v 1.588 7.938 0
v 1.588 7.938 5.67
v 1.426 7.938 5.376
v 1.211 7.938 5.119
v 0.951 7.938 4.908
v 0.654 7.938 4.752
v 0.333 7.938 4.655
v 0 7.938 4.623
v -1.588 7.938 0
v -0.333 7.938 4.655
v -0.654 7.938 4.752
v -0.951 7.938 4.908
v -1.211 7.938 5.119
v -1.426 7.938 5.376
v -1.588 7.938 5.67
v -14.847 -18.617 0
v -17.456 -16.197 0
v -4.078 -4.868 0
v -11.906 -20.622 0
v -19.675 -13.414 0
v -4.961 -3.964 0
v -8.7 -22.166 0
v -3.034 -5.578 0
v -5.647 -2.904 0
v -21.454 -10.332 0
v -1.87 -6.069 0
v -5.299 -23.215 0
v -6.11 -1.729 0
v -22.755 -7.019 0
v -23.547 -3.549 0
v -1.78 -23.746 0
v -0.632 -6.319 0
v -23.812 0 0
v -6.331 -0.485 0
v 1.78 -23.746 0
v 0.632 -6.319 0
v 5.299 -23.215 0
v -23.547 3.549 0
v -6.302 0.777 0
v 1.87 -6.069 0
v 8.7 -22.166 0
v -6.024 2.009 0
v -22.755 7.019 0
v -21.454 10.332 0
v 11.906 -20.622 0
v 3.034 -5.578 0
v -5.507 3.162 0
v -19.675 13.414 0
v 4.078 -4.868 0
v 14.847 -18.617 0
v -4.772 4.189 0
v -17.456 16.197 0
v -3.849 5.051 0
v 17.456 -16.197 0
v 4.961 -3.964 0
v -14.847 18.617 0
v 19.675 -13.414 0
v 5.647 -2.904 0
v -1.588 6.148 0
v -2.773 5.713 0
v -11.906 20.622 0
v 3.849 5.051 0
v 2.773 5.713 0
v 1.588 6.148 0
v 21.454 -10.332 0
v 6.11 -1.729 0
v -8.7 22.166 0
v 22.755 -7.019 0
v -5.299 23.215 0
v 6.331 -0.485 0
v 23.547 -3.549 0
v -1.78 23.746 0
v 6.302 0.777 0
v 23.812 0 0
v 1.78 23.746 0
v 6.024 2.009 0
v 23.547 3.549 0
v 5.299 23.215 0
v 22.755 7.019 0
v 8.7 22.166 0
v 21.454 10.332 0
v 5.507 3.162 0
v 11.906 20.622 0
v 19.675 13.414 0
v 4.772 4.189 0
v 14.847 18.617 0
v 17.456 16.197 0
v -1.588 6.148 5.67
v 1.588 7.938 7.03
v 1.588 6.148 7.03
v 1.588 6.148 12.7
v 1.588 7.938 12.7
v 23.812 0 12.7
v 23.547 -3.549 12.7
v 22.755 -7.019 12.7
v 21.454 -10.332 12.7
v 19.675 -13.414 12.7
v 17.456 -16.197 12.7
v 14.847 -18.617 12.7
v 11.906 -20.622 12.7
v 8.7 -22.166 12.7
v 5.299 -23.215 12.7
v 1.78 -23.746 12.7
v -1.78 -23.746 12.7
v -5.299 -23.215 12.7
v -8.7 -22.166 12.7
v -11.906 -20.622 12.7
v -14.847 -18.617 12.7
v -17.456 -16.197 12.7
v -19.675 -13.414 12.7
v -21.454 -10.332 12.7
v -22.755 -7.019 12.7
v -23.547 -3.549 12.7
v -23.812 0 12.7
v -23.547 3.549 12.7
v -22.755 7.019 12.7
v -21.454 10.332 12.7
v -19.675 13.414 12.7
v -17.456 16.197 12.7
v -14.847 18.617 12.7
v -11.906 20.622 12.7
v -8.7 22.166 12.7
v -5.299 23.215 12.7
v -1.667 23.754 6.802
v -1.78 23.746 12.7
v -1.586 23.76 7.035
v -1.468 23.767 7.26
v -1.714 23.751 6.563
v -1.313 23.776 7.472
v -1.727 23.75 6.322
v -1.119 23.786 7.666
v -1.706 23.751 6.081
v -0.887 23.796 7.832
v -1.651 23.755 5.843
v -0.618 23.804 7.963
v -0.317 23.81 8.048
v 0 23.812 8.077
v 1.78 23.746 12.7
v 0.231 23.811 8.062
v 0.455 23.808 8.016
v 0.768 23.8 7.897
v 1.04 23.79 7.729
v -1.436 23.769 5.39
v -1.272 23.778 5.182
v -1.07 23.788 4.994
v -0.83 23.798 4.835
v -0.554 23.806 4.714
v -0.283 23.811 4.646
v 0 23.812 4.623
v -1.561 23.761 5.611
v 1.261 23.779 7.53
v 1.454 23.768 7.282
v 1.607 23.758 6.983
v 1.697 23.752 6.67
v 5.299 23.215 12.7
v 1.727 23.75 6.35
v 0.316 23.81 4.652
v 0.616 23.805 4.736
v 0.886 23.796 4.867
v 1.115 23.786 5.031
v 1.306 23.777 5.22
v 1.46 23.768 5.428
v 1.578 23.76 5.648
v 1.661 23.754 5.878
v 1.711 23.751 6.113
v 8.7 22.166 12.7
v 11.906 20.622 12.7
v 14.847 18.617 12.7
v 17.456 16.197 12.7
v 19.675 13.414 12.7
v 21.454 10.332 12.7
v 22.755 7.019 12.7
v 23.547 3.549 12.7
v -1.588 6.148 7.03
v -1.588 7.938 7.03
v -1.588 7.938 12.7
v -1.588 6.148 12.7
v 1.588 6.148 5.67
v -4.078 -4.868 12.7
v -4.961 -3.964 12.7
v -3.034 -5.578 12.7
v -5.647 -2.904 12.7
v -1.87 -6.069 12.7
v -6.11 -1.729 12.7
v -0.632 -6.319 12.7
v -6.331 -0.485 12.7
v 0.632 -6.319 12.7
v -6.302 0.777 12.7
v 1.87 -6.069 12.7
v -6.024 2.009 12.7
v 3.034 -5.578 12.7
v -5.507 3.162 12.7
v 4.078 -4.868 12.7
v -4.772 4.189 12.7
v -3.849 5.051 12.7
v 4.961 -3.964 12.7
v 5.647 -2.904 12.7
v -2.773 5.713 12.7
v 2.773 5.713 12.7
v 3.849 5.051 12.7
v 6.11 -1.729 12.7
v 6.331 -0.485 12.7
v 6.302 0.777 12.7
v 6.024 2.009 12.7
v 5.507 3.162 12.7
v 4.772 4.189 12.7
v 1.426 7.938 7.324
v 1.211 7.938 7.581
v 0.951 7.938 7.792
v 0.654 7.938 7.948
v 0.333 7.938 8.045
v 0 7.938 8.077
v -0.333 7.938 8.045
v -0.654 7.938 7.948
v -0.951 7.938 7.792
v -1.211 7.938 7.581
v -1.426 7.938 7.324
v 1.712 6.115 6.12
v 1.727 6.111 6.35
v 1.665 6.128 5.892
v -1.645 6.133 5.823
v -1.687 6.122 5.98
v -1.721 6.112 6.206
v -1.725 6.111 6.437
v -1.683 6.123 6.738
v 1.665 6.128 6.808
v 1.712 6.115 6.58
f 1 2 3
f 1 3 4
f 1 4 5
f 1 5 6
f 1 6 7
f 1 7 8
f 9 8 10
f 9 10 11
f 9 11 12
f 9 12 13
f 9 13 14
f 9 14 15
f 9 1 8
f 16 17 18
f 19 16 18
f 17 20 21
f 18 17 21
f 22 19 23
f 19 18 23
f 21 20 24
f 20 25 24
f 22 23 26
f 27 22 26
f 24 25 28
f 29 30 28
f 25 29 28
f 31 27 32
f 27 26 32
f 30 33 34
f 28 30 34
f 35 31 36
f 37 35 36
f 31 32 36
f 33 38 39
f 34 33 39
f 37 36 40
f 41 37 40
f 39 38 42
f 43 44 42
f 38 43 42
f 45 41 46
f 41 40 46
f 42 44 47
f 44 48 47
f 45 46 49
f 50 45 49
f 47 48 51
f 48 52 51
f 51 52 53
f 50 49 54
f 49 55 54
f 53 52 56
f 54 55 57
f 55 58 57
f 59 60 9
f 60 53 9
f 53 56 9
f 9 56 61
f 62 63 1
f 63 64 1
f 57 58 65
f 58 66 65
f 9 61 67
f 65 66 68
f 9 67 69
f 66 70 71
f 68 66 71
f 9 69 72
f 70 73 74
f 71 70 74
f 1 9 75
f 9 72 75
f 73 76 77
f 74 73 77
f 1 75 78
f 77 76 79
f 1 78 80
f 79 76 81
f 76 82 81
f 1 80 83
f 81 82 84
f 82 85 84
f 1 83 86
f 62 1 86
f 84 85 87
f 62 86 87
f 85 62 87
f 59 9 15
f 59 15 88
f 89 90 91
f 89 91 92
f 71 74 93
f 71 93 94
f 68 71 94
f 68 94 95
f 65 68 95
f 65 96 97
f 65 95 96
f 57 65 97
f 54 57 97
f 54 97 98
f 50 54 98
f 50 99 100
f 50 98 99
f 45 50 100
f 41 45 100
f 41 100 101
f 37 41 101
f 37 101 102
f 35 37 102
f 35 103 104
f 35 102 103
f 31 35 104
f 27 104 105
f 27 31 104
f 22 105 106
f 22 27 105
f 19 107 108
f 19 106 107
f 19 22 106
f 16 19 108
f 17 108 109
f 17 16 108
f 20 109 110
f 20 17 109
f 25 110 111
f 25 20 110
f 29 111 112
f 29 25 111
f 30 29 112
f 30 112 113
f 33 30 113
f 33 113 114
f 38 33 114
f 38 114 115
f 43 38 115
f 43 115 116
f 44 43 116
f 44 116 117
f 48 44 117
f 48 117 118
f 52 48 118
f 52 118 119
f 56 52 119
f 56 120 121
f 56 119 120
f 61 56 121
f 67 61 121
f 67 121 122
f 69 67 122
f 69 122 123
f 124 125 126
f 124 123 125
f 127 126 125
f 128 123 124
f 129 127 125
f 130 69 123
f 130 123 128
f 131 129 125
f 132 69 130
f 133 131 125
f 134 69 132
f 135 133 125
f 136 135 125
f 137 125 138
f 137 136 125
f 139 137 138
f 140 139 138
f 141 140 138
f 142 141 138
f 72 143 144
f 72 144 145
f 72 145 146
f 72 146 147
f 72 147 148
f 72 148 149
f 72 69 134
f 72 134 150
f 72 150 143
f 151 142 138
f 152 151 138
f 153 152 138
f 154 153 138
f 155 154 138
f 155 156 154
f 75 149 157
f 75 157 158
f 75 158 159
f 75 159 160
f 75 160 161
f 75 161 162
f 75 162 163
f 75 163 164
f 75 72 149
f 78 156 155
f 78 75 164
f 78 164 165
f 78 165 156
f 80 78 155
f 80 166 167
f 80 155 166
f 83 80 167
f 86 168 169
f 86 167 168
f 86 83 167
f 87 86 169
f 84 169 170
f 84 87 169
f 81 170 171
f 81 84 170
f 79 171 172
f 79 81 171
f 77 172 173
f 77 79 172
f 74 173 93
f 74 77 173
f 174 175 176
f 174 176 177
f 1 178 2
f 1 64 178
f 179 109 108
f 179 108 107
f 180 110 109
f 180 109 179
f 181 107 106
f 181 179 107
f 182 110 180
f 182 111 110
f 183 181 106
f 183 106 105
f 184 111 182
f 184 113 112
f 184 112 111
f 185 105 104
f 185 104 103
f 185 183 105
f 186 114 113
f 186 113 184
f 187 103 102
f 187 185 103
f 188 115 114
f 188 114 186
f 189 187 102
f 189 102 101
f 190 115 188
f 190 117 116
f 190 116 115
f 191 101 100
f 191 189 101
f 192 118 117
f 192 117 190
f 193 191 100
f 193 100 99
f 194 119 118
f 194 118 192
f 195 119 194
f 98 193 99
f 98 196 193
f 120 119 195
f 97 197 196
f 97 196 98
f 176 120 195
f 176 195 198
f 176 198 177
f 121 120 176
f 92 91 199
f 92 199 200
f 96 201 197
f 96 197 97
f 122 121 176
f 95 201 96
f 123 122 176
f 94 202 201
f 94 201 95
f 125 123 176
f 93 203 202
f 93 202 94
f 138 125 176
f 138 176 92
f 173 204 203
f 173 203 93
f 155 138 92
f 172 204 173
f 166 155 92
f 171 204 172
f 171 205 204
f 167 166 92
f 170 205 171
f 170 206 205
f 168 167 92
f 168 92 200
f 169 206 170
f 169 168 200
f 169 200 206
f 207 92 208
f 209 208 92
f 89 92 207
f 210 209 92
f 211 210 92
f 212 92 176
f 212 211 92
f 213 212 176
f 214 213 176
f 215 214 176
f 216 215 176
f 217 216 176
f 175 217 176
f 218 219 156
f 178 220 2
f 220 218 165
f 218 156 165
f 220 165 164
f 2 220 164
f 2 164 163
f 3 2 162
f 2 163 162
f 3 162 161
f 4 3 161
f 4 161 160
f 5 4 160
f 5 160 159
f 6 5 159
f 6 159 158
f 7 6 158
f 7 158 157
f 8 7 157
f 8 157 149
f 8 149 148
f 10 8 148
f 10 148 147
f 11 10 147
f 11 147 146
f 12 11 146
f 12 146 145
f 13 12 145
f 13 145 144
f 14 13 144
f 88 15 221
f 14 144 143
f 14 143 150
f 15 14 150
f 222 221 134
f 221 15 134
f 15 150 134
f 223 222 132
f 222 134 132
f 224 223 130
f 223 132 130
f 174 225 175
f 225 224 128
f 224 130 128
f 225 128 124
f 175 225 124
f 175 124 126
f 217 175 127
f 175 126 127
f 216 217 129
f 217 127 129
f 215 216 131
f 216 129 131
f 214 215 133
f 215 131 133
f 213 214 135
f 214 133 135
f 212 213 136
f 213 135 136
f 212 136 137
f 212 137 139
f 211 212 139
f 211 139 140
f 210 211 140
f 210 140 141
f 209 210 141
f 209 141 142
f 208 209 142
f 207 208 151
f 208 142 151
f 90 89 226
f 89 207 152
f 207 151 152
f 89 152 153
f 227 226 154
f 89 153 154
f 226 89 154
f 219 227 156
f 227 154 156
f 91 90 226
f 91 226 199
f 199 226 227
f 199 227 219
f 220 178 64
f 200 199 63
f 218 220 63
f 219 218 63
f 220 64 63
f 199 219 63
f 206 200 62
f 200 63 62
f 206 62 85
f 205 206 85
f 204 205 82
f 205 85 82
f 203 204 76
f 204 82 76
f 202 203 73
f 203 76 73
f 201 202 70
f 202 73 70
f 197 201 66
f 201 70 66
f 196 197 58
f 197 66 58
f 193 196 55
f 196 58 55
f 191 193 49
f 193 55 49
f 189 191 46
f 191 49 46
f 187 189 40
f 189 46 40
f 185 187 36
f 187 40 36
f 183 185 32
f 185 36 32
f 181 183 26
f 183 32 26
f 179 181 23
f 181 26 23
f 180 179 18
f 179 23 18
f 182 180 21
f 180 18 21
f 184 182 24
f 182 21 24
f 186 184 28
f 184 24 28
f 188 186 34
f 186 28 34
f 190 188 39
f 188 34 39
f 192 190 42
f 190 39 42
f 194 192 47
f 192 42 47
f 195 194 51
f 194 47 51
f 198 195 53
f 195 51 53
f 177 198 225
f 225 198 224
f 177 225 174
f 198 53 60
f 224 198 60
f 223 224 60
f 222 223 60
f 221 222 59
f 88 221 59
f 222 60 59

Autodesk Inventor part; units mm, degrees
ref_plane "YZ Plane" through (0, 0, 0) normal (1, 0, 0) x (0, 1, 0)
ref_plane "XZ Plane" through (0, 0, 0) normal (0, 1, 0) x (-1, 0, 0)
sketch "Sketch1" plane through (0, 0, 0) normal (0, 0, 1) x (1, 0, 0)
  circle A0 centre (0, 0) radius 23.8125
  circle A1 centre (0, 0) radius 6.35
  line L0 (-1.5875, 4.7625) -> (1.5875, 4.7625)
  line L1 (1.5875, 4.7625) -> (1.5875, 7.9375)
  line L2 (1.5875, 7.9375) -> (-1.5875, 7.9375)
  line L3 (-1.5875, 7.9375) -> (-1.5875, 4.7625)
  dimension "d0" = 47.625
  dimension "d1" = 12.7
  dimension "d2" = 3.175
  dimension "d3" = 1.5875
  dimension "d4" = 7.9375
extrude "Extrusion1" add sketch "Sketch1" along normal blind 12.7
ref_plane "Work Plane1" through (0, 23.8125, 0) normal (0, -1, 0) x (1, 0, 0)
sketch "Sketch2" plane through (0, 23.8125, 0) normal (0, -1, 0) x (1, 0, 0)
  circle A0 centre (0, 6.35) radius 1.7272
  line L0 (-23.8125, 12.7) -> (23.8125, 12.7) projected
  line L1 (-23.8125, 0) -> (23.8125, 0) projected
  line L2 (-23.8125, 0) -> (-23.8125, 12.7) projected
  line L3 (23.8125, 0) -> (23.8125, 12.7) projected
  point P0 (0, 0)
  dimension "d7" = 3.4544
  dimension "d8" = 6.35
  dimension "d9" = 23.8125
extrude "Extrusion2" cut sketch "Sketch2" along normal blind 25.4 contours A0
equation "\"d3\" = 0.5 * d2"
equation "\"d4\" = 0.5 * d1 + d3"
properties part number "8 ball roller plug"
